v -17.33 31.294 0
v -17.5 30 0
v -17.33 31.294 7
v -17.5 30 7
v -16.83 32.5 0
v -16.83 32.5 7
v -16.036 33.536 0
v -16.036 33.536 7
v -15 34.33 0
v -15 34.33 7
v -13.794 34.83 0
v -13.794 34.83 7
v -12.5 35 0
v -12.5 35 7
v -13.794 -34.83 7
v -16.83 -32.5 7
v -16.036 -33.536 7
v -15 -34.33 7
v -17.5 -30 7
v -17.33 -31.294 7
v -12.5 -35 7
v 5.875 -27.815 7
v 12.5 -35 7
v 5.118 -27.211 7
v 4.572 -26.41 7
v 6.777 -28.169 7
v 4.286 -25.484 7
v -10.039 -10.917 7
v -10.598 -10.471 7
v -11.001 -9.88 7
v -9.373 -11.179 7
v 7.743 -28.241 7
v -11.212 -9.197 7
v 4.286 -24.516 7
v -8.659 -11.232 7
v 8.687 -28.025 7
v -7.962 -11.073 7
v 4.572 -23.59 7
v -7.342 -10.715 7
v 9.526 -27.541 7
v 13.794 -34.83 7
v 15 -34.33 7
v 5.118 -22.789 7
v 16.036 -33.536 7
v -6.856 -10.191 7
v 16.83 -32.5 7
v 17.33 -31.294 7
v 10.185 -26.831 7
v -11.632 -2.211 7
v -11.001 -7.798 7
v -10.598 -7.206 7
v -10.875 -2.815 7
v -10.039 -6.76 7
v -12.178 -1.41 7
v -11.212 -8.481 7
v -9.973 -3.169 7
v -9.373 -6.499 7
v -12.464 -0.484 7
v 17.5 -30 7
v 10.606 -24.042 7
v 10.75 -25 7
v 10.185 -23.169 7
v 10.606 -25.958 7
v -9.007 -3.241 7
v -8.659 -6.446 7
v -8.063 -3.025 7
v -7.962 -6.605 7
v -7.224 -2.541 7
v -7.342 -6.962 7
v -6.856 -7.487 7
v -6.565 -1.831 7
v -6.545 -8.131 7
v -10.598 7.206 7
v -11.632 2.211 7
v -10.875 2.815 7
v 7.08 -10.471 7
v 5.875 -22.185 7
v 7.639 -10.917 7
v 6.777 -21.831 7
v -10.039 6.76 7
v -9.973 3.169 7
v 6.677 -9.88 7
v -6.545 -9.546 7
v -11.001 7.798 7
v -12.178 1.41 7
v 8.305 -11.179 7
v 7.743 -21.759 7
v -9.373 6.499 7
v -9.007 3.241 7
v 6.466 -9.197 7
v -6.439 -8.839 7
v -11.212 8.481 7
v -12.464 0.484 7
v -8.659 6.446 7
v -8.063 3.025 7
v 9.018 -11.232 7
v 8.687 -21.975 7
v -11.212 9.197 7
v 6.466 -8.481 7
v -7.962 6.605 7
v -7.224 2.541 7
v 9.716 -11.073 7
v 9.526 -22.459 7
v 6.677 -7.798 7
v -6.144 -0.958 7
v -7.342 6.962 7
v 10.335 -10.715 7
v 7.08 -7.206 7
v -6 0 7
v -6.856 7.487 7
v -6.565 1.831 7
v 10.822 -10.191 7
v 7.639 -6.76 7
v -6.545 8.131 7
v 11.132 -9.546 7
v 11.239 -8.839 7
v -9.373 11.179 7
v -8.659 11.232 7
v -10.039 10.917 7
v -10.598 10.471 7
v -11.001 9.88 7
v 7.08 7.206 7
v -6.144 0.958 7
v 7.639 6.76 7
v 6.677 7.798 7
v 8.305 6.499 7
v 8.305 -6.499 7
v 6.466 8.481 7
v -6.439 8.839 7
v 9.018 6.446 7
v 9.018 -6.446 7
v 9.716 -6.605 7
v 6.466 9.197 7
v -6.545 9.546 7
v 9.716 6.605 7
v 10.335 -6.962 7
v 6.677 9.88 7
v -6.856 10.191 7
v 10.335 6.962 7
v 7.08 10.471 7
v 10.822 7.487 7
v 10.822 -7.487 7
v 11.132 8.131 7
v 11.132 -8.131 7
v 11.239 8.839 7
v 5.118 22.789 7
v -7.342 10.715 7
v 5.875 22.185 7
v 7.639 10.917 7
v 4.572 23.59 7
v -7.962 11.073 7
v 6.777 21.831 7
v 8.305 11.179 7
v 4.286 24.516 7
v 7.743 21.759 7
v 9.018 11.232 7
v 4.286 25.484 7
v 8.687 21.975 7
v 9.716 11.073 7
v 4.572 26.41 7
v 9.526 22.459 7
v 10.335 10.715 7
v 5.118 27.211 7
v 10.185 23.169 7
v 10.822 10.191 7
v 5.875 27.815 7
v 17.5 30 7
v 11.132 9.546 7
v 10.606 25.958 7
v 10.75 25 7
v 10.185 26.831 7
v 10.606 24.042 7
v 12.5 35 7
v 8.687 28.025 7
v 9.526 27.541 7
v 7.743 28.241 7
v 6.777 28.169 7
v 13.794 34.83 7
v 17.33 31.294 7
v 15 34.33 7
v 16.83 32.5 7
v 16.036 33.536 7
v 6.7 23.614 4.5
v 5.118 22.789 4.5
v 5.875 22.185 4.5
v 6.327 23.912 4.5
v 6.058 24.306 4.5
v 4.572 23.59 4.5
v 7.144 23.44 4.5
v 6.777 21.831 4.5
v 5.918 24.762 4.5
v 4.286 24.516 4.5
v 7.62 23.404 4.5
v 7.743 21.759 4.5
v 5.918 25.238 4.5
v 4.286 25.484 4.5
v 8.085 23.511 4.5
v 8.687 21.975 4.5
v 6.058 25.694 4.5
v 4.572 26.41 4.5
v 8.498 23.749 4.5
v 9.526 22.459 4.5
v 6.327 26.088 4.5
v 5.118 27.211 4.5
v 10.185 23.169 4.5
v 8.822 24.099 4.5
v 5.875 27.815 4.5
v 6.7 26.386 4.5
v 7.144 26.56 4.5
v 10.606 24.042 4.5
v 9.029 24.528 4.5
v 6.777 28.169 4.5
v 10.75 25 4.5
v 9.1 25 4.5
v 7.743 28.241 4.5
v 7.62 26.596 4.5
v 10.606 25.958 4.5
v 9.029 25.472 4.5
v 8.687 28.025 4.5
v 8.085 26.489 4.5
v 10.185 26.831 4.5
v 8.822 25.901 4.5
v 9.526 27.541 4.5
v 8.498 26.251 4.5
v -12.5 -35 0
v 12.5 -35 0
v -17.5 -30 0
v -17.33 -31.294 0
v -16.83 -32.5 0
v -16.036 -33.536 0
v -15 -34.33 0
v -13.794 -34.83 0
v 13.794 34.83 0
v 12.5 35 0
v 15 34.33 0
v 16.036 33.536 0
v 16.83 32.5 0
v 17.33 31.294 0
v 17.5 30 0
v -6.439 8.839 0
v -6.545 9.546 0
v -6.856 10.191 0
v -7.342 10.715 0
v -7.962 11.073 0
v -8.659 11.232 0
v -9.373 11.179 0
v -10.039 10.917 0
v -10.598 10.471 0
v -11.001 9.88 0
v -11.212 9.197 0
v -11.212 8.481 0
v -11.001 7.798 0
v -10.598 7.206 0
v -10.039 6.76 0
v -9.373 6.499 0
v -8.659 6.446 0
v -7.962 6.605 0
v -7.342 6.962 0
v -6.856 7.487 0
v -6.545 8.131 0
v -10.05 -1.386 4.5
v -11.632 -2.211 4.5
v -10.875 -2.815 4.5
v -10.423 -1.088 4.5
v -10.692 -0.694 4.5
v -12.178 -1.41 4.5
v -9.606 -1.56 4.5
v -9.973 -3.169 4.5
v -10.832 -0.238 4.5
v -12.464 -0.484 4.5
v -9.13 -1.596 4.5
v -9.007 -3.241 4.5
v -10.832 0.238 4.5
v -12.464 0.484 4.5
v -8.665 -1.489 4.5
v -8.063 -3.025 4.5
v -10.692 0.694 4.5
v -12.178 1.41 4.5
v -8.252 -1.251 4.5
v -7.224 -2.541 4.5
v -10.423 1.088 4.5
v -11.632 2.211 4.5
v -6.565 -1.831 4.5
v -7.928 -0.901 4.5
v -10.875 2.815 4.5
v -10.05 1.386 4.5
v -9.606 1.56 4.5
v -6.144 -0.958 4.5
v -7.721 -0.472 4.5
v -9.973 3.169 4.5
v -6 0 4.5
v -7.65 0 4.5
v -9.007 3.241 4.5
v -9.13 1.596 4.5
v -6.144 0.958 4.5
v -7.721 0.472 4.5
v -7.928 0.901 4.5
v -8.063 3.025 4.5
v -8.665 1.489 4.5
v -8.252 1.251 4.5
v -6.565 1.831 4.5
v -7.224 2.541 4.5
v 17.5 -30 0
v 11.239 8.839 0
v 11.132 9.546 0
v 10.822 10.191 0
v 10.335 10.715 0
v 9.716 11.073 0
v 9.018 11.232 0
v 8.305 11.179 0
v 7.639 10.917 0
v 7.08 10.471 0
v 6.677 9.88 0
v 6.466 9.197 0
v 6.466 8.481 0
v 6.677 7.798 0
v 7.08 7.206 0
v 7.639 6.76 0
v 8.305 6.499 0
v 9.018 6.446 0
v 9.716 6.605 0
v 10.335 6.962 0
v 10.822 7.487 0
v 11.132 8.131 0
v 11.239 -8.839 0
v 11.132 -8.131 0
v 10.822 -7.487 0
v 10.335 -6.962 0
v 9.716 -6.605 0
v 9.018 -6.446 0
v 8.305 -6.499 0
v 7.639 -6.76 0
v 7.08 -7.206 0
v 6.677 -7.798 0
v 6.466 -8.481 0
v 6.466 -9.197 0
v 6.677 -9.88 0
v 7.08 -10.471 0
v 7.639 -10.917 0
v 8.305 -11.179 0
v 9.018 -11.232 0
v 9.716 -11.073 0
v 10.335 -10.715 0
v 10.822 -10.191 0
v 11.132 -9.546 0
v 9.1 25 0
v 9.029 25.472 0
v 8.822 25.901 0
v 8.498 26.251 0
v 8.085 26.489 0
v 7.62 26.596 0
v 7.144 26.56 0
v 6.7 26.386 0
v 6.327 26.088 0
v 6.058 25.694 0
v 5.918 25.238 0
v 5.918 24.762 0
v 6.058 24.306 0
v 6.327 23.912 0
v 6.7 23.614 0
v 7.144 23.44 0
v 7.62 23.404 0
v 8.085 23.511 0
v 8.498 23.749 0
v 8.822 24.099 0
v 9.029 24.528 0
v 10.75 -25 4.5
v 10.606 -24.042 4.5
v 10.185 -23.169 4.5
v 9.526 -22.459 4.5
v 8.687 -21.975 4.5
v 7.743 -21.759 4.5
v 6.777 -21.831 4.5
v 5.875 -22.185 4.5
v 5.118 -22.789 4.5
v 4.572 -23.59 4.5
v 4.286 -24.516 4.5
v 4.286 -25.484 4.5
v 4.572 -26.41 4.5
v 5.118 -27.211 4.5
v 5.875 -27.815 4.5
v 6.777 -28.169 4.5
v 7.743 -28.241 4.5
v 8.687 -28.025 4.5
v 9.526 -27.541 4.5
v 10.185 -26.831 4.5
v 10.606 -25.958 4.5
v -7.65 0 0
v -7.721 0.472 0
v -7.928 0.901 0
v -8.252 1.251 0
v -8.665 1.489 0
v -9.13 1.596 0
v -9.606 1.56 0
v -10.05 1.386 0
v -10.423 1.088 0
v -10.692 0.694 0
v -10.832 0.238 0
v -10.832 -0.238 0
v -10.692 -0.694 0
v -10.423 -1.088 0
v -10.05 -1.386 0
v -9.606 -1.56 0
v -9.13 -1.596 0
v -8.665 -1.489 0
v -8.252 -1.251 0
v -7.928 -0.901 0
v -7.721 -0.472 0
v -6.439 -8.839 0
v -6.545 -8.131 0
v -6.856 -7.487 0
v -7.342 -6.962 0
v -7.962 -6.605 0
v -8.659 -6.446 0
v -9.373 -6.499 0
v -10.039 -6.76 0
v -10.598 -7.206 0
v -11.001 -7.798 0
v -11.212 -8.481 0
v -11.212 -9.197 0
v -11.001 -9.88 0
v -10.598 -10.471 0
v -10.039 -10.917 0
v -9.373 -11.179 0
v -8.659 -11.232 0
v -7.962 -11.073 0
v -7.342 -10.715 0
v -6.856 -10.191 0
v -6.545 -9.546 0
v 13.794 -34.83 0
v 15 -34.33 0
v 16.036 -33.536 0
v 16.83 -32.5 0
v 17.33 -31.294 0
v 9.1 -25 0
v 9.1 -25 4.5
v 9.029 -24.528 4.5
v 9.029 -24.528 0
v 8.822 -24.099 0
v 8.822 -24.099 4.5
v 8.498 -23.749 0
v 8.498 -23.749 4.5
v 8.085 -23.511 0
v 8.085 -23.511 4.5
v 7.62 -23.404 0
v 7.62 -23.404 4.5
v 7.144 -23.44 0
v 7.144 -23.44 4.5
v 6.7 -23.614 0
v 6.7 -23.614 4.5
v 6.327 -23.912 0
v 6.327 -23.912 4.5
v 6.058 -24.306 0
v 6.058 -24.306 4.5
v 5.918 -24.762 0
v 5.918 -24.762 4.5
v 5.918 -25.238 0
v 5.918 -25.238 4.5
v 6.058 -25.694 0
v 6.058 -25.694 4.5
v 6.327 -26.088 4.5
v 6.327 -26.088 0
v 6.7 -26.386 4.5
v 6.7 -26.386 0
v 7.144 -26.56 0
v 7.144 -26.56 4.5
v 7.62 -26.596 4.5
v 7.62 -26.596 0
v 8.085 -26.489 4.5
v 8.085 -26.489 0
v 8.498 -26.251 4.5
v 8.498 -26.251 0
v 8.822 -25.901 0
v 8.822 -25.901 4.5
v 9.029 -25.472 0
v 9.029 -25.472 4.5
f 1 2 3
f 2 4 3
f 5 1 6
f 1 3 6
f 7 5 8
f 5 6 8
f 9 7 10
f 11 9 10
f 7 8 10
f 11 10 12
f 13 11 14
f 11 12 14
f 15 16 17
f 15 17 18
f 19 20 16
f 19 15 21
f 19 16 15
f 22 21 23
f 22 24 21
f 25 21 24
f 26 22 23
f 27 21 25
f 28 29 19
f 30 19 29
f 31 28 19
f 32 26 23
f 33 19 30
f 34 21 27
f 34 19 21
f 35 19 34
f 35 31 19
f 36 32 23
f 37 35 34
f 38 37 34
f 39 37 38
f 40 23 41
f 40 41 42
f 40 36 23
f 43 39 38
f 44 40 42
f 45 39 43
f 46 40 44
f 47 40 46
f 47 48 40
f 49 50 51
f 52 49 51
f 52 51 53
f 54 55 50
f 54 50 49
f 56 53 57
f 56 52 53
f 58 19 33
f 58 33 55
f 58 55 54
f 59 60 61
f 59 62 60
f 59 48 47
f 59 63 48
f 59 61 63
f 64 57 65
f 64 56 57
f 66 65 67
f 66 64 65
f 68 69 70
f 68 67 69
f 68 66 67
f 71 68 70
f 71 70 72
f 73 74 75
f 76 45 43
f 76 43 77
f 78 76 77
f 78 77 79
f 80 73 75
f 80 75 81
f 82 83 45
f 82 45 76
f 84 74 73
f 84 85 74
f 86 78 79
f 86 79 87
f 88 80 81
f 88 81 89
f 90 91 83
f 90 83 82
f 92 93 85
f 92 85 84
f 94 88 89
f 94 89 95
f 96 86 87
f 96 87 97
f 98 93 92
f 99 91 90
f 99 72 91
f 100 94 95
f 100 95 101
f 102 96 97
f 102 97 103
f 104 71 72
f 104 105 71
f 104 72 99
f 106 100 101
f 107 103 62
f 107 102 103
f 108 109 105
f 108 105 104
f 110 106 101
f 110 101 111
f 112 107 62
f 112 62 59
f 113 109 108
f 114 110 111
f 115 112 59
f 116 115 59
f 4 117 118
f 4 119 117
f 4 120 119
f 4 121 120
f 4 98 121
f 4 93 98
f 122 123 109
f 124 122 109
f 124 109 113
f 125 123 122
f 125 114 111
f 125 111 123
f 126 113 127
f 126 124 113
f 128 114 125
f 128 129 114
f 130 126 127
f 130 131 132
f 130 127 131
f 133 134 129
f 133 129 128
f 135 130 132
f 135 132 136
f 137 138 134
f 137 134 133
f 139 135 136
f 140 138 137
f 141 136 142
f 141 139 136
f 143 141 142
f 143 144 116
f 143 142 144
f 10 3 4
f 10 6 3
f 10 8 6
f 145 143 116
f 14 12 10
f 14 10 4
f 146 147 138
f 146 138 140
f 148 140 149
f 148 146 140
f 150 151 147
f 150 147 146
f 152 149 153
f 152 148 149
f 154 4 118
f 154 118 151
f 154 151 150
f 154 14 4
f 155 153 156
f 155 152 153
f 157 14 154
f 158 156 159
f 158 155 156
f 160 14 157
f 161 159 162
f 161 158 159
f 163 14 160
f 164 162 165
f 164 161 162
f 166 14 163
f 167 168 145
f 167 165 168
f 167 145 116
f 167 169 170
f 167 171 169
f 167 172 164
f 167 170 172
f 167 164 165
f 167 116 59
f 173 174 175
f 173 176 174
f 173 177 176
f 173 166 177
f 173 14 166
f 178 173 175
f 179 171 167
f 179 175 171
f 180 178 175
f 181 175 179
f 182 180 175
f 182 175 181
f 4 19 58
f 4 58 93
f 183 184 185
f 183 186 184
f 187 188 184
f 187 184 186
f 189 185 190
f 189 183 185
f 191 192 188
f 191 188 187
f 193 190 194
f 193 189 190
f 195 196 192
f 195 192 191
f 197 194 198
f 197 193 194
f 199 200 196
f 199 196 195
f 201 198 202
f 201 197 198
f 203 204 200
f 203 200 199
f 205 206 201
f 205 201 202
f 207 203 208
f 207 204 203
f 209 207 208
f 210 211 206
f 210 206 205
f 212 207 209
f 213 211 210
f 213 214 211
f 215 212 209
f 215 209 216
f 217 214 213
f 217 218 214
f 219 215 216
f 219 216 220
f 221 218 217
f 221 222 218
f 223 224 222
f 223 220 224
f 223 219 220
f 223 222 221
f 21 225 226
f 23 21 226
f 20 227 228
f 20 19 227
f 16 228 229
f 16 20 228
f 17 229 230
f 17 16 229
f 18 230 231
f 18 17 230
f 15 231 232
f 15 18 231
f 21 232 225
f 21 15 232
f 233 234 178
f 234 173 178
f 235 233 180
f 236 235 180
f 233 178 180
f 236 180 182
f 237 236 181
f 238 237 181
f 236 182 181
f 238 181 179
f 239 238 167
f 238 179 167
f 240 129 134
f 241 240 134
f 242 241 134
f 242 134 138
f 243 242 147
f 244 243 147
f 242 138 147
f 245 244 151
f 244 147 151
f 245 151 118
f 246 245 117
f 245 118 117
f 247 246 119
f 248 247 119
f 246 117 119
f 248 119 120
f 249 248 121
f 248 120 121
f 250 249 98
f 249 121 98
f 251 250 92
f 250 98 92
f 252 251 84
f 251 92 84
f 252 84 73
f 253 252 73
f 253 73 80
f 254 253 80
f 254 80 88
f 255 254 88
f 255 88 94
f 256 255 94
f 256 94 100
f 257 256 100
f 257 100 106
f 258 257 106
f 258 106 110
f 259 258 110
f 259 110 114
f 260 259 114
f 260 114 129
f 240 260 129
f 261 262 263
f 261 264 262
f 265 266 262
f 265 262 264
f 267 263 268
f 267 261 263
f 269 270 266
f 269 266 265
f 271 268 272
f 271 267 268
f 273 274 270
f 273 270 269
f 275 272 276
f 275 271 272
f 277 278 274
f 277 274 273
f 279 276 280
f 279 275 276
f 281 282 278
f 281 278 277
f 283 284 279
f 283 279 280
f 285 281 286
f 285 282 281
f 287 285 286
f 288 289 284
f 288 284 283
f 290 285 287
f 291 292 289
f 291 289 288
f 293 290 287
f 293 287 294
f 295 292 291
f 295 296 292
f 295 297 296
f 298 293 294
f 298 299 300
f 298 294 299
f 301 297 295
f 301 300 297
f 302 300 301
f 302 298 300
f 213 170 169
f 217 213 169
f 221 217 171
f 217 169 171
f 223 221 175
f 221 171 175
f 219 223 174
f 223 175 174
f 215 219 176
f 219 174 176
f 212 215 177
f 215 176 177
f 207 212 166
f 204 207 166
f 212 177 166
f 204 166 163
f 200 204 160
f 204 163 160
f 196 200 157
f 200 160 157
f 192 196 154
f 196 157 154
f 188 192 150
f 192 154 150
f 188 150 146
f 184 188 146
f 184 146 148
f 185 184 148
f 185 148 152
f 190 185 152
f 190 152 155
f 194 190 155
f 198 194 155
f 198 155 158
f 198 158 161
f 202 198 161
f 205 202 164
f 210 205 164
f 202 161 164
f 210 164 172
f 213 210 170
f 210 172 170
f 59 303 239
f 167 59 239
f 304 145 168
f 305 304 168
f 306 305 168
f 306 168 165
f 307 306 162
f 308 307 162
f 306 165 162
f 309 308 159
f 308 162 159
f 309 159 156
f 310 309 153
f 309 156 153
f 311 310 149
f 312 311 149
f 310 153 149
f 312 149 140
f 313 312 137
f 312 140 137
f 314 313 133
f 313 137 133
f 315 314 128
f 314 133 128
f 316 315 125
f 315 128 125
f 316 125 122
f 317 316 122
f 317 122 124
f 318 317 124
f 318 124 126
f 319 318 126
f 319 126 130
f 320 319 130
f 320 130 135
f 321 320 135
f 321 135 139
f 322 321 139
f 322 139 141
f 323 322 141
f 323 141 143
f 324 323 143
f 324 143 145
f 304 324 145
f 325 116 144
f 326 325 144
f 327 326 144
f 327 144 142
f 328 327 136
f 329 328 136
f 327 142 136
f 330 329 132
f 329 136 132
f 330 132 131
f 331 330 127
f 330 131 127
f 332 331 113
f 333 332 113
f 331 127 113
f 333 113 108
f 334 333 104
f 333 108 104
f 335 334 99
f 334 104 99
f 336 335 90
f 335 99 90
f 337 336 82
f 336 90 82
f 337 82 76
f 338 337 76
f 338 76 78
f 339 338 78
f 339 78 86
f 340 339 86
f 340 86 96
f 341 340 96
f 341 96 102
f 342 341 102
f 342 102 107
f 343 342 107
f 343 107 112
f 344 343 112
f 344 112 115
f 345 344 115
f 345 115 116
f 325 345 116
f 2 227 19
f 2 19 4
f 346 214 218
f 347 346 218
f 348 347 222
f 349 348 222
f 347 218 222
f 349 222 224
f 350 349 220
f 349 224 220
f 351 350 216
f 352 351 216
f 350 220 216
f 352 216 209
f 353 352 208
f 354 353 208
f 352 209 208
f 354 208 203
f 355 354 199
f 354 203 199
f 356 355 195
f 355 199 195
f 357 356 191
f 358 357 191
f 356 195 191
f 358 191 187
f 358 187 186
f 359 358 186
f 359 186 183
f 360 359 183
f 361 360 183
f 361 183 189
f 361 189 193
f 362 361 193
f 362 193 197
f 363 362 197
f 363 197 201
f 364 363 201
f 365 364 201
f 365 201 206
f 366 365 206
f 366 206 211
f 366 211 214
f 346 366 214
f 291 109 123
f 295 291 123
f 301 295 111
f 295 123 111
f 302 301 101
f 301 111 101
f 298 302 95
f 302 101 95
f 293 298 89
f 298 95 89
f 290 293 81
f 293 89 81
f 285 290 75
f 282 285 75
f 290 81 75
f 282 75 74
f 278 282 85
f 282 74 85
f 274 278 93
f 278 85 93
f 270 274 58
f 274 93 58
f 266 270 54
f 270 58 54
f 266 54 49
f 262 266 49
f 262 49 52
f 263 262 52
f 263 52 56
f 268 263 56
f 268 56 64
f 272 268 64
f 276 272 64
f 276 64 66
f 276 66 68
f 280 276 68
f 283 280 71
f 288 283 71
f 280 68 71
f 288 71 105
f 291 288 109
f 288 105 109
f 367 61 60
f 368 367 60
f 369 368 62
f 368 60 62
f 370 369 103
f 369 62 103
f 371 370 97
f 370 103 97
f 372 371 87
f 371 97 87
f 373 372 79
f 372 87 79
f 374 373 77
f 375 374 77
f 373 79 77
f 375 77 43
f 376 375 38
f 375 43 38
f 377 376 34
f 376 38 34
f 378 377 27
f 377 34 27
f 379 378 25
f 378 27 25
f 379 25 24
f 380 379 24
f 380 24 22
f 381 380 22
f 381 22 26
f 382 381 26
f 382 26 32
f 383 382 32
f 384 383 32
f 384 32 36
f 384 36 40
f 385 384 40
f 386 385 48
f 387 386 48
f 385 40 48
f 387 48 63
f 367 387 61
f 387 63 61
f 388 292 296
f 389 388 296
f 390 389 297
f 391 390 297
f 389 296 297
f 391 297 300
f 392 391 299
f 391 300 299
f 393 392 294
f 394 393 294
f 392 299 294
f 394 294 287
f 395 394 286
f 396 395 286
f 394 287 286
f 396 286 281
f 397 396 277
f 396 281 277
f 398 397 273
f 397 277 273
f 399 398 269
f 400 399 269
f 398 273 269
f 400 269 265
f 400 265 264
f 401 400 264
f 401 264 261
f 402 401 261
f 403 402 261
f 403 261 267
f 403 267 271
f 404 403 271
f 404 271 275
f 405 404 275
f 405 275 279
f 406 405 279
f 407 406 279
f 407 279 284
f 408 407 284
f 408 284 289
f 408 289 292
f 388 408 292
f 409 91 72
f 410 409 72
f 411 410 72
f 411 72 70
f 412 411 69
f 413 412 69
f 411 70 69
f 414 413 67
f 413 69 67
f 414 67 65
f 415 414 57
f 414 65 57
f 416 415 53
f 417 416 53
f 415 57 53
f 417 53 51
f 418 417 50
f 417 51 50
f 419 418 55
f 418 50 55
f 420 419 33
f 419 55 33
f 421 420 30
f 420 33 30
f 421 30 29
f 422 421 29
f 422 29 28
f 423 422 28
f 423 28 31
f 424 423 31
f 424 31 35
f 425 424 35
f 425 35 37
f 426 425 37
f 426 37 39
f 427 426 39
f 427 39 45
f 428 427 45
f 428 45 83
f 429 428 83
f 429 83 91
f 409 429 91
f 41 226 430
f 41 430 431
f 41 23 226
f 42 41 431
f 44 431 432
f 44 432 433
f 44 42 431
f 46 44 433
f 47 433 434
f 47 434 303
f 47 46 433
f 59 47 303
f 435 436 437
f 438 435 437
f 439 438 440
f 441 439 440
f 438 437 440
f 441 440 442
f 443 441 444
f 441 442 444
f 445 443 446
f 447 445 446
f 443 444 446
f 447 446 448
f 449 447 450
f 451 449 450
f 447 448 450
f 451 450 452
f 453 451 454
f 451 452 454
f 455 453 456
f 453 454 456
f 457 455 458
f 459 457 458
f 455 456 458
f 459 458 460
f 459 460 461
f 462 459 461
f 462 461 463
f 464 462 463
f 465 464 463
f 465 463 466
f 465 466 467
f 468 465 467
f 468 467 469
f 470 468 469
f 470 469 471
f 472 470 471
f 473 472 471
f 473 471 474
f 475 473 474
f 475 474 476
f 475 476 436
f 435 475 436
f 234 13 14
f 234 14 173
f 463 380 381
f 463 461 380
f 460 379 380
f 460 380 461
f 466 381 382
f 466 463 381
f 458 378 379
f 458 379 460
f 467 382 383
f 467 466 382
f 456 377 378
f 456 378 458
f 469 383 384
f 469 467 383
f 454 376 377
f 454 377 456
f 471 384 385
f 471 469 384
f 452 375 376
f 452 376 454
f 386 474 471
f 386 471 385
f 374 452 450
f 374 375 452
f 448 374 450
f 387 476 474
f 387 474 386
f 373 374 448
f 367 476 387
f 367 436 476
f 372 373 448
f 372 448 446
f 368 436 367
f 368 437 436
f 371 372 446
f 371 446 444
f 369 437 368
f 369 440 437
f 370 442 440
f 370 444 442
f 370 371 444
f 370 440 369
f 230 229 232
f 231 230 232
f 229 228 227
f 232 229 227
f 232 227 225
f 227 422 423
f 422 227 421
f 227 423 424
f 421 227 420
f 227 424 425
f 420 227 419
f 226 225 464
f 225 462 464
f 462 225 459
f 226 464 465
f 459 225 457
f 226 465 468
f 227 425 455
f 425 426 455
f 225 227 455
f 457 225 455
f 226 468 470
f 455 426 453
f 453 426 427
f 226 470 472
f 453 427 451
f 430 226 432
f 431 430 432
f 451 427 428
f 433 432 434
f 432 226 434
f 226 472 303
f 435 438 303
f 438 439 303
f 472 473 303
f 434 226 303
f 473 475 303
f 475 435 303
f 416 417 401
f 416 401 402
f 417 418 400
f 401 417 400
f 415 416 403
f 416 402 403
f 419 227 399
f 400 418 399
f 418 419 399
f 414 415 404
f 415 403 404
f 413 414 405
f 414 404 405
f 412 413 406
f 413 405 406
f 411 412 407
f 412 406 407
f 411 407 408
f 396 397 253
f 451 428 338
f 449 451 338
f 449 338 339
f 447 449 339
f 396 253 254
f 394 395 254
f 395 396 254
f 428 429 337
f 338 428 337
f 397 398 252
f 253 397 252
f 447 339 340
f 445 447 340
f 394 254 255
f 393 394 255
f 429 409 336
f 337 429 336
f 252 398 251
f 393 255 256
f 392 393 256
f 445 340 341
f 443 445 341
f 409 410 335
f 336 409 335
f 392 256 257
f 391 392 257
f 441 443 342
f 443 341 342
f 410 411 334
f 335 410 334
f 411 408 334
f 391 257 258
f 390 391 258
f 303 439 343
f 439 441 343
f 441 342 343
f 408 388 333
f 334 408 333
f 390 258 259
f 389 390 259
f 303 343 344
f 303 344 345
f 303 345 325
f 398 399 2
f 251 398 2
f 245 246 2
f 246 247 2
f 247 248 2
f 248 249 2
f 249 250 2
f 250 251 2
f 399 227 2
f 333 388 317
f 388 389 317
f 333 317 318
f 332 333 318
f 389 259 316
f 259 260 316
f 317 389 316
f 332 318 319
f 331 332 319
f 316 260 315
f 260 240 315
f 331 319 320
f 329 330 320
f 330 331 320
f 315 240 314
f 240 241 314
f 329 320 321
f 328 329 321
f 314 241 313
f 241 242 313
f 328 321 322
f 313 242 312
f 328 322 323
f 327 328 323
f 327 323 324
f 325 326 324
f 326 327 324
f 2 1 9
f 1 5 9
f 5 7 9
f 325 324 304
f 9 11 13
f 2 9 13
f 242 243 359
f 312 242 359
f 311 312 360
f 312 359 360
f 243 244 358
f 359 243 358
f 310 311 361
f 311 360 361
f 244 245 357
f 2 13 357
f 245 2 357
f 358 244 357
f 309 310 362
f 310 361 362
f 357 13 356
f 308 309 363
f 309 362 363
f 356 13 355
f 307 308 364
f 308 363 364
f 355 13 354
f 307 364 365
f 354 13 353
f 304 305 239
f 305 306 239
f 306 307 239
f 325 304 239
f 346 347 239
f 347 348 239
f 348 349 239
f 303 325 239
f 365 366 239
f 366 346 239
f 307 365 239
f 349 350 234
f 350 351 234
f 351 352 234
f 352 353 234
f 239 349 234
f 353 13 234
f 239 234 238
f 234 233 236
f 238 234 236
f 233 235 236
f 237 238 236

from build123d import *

# Parameters (mm, degrees)
SKETCH054_W     = 35
SKETCH054_H     = 70
PAD009_DEPTH    = 7
SKETCH055_R     = 1.6
SKETCH055_R_2   = 2.4
POCKET035_DEPTH = 10
SKETCH056_R     = 3.25
POCKET036_DEPTH = 2.5
FILLET004_R     = 5


with BuildPart() as part:
    # Sketch054 → Pad009 (new body)
    with BuildSketch(Plane.XY):
        Rectangle(SKETCH054_W, SKETCH054_H)
    extrude(amount=PAD009_DEPTH)

    # Sketch055 (on Face6 of Pad009) → Pocket035 (cut)
    with BuildSketch(Plane.XY.offset(7)):
        with Locations((7.5, 25)):
            Circle(SKETCH055_R)
        with Locations((-9.25, 0)):
            Circle(SKETCH055_R)
        with Locations((7.5, -25)):
            Circle(SKETCH055_R)
        with Locations((-8.8388347648, 8.8388347648)):
            Circle(SKETCH055_R_2)
        with Locations((8.8388347648, 8.8388347648)):
            Circle(SKETCH055_R_2)
        with Locations((-8.8388347648, -8.8388347648)):
            Circle(SKETCH055_R_2)
        with Locations((8.8388347648, -8.8388347648)):
            Circle(SKETCH055_R_2)
    extrude(amount=-POCKET035_DEPTH, mode=Mode.SUBTRACT)

    # Sketch056 (on Face5 of Pocket035) → Pocket036 (cut)
    with BuildSketch(Plane.XY.offset(7)):
        with Locations((-9.25, 0)):
            Circle(SKETCH056_R)
        with Locations((7.5, 25)):
            Circle(SKETCH056_R)
        with Locations((7.5, -25)):
            Circle(SKETCH056_R)
    extrude(amount=-POCKET036_DEPTH, mode=Mode.SUBTRACT)

    # Fillet004
    fillet004_edges = [part.edges().sort_by_distance(p)[0] for p in [
        (-17.5, -35, 3.5),
        (17.5, -35, 3.5),
        (-17.5, 35, 3.5),
        (17.5, 35, 3.5),
    ]]
    fillet(fillet004_edges, radius=FILLET004_R)


solid = part.part
